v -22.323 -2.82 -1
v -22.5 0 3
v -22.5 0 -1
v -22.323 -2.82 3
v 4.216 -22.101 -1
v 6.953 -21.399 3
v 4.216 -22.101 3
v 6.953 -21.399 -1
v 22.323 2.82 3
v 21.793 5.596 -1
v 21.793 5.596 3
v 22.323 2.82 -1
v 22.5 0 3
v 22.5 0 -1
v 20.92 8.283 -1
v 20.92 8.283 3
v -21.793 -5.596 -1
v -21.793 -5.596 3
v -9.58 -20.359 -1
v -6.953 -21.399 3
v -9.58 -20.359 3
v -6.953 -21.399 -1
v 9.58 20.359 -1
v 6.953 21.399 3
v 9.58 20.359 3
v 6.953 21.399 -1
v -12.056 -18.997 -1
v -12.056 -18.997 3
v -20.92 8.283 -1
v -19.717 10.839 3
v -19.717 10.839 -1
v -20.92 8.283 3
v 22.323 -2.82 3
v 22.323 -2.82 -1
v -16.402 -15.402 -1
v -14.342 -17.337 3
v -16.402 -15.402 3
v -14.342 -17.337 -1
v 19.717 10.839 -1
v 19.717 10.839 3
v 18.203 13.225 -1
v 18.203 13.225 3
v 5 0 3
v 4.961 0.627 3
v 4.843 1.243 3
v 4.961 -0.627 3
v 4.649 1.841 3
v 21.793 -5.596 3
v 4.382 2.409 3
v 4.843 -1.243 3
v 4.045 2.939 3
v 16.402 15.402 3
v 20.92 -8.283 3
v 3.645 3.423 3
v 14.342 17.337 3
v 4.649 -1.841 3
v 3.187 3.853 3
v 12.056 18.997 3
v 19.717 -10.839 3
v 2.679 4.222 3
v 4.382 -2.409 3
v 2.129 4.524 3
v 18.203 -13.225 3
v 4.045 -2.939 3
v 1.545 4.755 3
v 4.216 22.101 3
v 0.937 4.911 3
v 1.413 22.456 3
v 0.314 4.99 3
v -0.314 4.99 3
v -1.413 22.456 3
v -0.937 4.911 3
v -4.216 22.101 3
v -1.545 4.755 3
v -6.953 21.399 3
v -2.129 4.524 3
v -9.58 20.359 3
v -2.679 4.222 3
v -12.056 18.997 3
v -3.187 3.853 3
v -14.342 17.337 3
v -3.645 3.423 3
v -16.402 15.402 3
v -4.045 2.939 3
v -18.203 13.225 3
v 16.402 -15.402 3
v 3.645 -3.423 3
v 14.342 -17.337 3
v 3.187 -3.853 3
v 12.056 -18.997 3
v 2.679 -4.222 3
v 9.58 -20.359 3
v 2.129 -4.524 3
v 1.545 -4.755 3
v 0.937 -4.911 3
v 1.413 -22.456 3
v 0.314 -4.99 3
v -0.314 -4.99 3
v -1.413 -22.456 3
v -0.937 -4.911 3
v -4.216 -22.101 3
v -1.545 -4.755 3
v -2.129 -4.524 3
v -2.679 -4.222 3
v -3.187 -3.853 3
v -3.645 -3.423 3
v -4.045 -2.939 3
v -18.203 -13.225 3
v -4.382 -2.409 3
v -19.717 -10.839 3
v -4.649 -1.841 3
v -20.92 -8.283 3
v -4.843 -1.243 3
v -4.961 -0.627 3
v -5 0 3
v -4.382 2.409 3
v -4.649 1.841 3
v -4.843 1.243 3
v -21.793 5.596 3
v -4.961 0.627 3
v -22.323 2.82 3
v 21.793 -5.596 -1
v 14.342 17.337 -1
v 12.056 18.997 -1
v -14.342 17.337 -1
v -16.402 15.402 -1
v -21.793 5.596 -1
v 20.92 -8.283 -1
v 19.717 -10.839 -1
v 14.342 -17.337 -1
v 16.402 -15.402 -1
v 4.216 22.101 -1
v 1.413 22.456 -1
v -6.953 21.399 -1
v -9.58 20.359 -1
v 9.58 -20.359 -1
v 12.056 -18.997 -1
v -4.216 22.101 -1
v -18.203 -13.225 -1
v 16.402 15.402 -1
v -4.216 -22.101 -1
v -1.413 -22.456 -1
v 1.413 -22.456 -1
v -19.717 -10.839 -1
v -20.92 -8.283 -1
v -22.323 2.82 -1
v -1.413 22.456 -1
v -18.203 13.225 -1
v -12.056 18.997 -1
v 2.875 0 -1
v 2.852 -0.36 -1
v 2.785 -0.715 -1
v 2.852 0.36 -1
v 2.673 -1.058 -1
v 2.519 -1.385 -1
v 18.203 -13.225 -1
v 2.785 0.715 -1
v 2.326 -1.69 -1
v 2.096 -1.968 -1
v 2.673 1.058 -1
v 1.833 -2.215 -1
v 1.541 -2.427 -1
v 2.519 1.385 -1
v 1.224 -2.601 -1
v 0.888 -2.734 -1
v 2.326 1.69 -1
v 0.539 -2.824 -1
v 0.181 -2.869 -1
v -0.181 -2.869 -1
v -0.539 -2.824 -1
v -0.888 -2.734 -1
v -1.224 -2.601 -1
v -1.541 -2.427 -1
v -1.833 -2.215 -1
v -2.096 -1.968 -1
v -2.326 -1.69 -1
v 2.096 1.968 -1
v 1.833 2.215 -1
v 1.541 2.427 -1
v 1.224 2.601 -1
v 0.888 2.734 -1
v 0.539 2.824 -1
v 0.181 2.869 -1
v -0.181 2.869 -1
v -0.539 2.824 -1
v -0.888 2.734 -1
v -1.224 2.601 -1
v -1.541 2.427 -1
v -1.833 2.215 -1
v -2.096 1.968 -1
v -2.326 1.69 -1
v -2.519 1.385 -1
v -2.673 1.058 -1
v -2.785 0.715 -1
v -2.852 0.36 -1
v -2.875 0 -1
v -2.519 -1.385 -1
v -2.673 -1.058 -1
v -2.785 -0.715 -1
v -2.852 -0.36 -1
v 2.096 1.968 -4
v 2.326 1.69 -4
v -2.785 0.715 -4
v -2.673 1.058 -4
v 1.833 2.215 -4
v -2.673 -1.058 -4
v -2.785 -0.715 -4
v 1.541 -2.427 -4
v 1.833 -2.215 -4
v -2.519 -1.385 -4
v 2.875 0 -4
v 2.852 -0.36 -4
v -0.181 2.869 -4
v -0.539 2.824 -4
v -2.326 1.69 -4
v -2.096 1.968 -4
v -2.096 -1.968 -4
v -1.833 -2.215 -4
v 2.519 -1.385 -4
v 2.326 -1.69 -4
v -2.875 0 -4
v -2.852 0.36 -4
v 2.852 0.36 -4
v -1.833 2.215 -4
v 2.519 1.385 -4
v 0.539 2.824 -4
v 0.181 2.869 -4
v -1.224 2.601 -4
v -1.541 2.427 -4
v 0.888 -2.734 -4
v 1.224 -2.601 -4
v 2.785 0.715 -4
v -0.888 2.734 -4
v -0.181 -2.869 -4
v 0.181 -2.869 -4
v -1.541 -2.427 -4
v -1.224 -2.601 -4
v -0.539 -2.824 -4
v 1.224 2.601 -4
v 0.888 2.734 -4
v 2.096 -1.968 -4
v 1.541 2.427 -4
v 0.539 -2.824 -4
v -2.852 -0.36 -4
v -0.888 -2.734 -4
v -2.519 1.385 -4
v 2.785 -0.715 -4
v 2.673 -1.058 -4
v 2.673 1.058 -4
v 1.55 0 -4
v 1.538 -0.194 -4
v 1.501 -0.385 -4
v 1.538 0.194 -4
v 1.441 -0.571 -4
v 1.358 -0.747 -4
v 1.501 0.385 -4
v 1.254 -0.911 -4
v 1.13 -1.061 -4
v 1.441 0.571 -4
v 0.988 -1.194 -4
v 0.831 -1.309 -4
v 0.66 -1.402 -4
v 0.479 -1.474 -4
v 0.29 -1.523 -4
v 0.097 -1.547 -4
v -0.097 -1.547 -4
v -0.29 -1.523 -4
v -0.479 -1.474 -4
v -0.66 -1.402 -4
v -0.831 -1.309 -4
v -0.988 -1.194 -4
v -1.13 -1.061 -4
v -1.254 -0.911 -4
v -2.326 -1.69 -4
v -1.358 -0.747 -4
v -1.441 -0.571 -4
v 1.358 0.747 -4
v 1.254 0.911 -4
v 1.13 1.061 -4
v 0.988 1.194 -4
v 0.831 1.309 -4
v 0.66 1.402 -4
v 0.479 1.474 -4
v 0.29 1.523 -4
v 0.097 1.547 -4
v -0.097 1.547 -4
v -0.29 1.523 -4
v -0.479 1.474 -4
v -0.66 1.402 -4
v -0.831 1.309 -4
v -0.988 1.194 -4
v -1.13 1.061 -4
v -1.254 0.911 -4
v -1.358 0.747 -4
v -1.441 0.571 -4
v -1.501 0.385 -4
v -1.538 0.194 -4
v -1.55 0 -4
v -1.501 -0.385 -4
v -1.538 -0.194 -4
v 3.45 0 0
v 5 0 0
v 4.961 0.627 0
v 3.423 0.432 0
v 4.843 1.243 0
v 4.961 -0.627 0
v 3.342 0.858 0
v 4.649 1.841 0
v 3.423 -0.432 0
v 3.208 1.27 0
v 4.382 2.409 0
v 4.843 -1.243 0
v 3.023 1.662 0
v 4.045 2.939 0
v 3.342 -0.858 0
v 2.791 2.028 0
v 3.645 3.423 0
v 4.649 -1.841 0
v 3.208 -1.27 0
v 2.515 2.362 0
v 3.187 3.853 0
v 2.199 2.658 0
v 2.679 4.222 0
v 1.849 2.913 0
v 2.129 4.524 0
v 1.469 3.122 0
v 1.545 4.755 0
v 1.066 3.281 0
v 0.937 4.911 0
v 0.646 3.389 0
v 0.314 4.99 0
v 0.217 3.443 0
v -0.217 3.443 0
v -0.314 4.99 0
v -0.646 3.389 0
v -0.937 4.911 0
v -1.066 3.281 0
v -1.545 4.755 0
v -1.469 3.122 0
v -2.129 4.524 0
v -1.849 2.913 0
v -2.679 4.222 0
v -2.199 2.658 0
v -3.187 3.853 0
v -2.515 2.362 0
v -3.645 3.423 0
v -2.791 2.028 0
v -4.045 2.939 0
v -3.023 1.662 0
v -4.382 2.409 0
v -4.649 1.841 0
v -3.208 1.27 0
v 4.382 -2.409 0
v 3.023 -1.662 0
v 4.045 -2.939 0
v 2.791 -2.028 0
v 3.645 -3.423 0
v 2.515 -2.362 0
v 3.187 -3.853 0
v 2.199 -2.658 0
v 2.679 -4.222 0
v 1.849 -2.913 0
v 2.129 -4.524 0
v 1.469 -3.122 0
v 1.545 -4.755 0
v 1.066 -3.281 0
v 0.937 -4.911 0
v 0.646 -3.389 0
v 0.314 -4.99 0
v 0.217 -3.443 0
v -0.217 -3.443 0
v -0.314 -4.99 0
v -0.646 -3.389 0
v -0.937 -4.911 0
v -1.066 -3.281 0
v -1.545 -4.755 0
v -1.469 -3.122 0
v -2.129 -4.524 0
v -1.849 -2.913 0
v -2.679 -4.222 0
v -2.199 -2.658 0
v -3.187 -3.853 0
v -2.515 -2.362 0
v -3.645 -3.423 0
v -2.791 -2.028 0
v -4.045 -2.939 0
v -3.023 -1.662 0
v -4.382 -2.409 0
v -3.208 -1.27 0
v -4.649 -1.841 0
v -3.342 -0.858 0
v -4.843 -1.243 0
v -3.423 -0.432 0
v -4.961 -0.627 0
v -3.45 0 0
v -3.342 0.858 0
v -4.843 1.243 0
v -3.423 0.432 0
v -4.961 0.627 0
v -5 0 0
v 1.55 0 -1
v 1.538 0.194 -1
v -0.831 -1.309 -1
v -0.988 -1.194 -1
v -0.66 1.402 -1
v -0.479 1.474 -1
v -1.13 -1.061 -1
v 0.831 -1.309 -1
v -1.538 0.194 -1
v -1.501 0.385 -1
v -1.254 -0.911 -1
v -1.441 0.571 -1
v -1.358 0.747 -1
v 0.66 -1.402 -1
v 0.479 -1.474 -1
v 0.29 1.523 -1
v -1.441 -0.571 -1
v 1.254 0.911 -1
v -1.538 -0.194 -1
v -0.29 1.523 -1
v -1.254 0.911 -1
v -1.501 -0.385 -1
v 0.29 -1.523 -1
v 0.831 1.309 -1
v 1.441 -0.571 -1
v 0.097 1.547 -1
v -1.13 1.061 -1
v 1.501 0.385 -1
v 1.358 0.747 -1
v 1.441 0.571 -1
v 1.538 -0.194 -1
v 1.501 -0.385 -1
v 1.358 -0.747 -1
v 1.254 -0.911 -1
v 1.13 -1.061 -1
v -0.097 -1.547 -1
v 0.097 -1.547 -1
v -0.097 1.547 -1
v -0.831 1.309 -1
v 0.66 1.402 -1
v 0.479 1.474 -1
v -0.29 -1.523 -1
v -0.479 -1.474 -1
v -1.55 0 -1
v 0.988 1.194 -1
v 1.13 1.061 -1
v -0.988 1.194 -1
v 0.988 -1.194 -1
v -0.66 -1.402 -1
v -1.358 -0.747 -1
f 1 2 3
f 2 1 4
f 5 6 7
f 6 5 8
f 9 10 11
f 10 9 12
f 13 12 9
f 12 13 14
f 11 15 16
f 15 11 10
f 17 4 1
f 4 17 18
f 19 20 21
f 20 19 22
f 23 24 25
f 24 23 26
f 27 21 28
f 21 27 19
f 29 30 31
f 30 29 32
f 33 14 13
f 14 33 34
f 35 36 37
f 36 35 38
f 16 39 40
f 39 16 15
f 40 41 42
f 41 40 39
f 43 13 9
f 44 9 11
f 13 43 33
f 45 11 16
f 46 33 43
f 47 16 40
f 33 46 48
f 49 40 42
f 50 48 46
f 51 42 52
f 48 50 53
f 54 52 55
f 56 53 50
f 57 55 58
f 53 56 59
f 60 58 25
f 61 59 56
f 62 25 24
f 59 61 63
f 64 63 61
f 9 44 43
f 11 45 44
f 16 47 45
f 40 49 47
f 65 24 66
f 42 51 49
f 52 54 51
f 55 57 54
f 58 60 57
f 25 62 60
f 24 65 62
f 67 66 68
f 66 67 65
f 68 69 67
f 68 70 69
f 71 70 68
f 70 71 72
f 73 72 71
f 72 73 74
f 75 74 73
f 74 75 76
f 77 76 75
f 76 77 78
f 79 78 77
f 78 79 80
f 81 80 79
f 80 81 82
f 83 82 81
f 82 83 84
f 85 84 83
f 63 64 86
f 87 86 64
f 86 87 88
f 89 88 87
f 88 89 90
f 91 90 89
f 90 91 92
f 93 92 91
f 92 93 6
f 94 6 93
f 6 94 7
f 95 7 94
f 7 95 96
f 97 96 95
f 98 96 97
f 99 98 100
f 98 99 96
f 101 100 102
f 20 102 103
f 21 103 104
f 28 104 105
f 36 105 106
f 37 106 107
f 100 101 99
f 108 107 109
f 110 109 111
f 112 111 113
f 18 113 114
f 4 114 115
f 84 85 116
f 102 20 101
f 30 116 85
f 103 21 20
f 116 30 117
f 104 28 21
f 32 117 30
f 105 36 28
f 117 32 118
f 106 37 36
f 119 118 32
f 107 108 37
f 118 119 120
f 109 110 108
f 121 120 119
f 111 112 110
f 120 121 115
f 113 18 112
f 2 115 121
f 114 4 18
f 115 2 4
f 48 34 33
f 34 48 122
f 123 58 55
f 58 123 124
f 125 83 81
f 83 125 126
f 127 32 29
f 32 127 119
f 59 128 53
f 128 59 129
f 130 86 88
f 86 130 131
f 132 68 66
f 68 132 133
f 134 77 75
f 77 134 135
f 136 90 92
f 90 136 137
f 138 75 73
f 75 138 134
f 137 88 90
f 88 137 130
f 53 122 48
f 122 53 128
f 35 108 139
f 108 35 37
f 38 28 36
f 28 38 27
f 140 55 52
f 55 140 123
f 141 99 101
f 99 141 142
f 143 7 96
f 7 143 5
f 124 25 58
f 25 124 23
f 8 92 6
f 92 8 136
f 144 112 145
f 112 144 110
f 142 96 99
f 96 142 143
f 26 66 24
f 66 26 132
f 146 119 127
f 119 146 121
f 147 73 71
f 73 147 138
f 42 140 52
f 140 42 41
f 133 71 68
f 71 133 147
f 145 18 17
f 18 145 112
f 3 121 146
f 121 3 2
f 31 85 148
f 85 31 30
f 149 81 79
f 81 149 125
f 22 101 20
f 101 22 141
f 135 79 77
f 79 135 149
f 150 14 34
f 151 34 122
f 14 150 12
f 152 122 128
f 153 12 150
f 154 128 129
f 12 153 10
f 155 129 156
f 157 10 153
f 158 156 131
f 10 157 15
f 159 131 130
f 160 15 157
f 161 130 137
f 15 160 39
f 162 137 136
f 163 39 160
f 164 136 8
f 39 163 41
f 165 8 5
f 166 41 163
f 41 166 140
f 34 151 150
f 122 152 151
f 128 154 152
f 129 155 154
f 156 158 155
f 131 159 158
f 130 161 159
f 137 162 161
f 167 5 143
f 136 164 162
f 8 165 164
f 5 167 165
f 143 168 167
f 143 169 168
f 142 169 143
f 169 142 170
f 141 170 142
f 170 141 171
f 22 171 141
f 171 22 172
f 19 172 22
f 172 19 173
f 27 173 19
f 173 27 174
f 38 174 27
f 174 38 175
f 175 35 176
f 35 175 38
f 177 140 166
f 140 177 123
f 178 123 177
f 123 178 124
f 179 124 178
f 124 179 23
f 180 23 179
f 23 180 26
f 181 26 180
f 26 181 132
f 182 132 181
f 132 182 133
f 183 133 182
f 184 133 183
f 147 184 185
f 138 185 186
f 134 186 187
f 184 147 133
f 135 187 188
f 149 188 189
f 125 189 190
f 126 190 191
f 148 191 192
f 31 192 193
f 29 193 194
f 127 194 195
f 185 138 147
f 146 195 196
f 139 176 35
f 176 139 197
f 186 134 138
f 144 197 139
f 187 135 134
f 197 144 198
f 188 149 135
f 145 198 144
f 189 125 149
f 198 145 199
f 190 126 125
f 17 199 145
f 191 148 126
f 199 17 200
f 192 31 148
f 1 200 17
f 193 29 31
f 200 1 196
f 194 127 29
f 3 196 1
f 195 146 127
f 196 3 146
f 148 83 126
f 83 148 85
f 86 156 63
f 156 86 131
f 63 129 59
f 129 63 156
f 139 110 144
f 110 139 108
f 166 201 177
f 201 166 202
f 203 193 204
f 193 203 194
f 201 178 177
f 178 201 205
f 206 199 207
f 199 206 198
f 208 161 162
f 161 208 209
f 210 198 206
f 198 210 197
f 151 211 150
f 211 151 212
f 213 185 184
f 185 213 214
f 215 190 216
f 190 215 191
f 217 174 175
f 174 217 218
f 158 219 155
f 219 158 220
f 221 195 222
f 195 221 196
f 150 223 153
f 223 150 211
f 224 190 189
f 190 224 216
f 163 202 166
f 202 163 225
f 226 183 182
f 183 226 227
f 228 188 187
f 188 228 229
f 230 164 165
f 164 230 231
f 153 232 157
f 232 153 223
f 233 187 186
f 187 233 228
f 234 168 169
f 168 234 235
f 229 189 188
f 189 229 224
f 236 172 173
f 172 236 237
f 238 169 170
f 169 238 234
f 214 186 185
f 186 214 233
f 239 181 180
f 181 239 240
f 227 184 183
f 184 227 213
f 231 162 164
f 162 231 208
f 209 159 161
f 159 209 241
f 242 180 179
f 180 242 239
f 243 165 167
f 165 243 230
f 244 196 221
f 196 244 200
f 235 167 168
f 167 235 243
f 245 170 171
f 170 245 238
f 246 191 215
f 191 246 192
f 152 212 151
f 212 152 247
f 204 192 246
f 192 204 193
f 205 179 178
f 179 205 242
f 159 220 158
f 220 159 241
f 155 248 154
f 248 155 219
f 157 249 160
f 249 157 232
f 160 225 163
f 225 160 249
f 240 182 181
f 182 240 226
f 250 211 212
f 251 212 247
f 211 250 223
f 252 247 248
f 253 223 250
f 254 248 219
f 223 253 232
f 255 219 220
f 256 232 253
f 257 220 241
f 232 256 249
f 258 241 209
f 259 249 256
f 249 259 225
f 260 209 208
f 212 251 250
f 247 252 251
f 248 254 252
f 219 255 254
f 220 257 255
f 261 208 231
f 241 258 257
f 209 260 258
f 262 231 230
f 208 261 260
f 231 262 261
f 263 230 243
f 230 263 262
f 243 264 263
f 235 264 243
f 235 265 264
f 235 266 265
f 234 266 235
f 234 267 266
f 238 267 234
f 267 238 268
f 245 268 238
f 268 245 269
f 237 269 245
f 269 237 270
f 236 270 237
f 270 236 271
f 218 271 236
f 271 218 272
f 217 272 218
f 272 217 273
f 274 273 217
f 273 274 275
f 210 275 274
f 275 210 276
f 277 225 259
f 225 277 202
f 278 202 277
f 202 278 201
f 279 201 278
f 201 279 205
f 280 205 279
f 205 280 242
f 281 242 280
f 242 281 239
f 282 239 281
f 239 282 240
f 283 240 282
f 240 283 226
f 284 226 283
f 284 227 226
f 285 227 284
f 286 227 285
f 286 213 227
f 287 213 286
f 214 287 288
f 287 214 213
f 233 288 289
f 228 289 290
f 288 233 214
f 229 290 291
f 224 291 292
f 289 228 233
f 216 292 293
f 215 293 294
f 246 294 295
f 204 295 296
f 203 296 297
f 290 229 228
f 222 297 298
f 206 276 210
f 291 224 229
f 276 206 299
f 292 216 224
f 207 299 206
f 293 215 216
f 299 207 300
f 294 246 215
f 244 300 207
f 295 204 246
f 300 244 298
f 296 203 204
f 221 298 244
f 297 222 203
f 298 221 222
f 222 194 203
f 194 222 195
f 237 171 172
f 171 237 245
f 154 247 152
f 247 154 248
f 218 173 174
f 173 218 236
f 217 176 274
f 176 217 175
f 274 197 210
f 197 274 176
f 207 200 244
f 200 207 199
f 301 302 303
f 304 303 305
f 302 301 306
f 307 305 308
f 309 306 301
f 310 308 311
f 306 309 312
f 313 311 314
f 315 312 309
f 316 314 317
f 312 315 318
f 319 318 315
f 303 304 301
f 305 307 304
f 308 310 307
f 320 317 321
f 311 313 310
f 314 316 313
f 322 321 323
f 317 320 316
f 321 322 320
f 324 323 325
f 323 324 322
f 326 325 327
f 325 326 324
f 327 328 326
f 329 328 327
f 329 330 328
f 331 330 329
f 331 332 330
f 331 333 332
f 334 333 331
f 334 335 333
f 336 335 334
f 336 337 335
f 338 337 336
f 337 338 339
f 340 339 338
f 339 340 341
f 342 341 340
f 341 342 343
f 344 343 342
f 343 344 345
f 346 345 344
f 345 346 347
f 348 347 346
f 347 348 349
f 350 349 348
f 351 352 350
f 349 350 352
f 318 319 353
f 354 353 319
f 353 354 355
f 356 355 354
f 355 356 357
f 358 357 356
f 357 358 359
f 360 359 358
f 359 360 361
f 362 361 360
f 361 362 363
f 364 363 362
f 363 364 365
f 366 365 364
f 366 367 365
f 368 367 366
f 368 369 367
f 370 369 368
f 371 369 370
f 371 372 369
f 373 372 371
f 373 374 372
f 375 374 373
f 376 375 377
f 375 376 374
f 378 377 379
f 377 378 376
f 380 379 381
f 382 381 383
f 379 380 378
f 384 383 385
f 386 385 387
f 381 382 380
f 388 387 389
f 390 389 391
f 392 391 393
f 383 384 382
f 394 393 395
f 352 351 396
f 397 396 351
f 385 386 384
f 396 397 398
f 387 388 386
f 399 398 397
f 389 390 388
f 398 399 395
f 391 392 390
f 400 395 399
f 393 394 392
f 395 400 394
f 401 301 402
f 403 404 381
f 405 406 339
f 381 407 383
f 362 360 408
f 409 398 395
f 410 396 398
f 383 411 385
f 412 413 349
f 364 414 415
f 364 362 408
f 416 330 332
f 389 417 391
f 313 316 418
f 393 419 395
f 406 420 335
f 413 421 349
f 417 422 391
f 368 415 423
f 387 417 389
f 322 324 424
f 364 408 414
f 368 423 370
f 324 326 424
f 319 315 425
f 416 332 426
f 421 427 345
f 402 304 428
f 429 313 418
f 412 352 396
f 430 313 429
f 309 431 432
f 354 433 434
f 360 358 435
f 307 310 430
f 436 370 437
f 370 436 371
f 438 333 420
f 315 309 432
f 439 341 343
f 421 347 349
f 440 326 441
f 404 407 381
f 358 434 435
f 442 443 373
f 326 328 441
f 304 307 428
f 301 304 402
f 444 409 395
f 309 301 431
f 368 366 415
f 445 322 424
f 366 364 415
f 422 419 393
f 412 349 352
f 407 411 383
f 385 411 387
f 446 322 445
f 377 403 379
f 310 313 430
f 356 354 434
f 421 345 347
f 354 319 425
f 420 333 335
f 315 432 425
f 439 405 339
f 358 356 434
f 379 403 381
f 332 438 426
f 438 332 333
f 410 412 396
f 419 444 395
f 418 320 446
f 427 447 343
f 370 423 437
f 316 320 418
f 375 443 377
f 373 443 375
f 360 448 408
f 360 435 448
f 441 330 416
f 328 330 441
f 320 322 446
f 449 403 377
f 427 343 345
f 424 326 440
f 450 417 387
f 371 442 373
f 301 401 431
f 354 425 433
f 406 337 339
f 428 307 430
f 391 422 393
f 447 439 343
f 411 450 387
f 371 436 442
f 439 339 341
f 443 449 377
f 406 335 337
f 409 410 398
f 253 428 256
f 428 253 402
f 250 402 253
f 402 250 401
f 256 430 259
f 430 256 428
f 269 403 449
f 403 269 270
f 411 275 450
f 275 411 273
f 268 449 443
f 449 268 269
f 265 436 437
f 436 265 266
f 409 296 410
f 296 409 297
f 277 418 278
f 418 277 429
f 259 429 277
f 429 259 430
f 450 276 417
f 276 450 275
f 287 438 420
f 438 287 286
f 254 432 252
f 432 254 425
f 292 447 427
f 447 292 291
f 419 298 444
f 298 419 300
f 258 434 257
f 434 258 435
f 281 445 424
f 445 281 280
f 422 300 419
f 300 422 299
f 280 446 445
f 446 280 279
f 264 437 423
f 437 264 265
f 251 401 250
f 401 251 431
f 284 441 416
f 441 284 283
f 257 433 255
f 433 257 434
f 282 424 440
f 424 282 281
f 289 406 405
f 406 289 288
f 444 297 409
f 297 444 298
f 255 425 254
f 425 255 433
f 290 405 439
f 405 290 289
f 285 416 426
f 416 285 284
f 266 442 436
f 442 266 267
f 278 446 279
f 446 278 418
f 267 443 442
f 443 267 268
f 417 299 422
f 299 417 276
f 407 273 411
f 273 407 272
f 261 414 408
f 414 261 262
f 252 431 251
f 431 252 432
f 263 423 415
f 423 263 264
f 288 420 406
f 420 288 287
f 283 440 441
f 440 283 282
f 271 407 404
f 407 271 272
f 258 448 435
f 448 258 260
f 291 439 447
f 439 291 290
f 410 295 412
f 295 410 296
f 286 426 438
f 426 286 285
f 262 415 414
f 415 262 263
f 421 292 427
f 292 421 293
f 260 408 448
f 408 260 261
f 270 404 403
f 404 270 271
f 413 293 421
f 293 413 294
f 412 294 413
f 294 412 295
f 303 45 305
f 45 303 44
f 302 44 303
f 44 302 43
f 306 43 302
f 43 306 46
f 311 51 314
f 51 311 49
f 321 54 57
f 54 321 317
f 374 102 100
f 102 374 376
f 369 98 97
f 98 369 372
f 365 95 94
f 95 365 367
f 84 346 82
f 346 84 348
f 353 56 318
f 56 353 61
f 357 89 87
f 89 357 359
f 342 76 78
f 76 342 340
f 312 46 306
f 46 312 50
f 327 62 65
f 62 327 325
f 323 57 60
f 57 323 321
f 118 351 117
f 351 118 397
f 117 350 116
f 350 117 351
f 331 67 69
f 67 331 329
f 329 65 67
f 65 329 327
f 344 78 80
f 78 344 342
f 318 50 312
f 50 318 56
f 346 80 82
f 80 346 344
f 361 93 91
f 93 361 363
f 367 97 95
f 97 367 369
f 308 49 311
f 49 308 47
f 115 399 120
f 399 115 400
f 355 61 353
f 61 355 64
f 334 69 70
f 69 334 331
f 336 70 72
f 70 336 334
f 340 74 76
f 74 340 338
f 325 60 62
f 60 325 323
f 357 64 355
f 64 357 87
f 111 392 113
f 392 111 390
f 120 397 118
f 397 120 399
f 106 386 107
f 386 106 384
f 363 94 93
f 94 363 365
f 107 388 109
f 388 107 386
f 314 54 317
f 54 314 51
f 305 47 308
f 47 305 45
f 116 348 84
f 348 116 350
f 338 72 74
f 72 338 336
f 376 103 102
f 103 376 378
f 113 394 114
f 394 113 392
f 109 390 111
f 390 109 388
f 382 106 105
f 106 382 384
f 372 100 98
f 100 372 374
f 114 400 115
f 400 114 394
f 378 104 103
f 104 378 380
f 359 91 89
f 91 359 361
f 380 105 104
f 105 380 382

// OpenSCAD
$fn = 50;


difference() {
	union() {
		translate(v = [0, 0, -1.0000000000]) {
			cylinder(h = 4.0000000000, r = 22.5000000000);
		}
		#translate(v = [0, 0, -4.0000000000]) {
			cylinder(h = 4.0000000000, r = 2.8750000000);
		}
	}
	union() {
		translate(v = [0, 0, 0]) {
			rotate(a = [0, 0, 0]) {
				difference() {
					union() {
						translate(v = [0, 0, -4.0000000000]) {
							cylinder(h = 4.0000000000, r = 1.2500000000);
						}
						translate(v = [0, 0, -1.0000000000]) {
							cylinder(h = 1.0000000000, r1 = 1.5500000000, r2 = 3.4500000000);
						}
						translate(v = [0, 0, -4.0000000000]) {
							cylinder(h = 4.0000000000, r = 1.5500000000);
						}
						translate(v = [0, 0, -4.0000000000]) {
							cylinder(h = 4.0000000000, r = 1.2500000000);
						}
					}
					union();
				}
			}
		}
		#cylinder(h = 3, r = 5.0000000000);
	}
}
